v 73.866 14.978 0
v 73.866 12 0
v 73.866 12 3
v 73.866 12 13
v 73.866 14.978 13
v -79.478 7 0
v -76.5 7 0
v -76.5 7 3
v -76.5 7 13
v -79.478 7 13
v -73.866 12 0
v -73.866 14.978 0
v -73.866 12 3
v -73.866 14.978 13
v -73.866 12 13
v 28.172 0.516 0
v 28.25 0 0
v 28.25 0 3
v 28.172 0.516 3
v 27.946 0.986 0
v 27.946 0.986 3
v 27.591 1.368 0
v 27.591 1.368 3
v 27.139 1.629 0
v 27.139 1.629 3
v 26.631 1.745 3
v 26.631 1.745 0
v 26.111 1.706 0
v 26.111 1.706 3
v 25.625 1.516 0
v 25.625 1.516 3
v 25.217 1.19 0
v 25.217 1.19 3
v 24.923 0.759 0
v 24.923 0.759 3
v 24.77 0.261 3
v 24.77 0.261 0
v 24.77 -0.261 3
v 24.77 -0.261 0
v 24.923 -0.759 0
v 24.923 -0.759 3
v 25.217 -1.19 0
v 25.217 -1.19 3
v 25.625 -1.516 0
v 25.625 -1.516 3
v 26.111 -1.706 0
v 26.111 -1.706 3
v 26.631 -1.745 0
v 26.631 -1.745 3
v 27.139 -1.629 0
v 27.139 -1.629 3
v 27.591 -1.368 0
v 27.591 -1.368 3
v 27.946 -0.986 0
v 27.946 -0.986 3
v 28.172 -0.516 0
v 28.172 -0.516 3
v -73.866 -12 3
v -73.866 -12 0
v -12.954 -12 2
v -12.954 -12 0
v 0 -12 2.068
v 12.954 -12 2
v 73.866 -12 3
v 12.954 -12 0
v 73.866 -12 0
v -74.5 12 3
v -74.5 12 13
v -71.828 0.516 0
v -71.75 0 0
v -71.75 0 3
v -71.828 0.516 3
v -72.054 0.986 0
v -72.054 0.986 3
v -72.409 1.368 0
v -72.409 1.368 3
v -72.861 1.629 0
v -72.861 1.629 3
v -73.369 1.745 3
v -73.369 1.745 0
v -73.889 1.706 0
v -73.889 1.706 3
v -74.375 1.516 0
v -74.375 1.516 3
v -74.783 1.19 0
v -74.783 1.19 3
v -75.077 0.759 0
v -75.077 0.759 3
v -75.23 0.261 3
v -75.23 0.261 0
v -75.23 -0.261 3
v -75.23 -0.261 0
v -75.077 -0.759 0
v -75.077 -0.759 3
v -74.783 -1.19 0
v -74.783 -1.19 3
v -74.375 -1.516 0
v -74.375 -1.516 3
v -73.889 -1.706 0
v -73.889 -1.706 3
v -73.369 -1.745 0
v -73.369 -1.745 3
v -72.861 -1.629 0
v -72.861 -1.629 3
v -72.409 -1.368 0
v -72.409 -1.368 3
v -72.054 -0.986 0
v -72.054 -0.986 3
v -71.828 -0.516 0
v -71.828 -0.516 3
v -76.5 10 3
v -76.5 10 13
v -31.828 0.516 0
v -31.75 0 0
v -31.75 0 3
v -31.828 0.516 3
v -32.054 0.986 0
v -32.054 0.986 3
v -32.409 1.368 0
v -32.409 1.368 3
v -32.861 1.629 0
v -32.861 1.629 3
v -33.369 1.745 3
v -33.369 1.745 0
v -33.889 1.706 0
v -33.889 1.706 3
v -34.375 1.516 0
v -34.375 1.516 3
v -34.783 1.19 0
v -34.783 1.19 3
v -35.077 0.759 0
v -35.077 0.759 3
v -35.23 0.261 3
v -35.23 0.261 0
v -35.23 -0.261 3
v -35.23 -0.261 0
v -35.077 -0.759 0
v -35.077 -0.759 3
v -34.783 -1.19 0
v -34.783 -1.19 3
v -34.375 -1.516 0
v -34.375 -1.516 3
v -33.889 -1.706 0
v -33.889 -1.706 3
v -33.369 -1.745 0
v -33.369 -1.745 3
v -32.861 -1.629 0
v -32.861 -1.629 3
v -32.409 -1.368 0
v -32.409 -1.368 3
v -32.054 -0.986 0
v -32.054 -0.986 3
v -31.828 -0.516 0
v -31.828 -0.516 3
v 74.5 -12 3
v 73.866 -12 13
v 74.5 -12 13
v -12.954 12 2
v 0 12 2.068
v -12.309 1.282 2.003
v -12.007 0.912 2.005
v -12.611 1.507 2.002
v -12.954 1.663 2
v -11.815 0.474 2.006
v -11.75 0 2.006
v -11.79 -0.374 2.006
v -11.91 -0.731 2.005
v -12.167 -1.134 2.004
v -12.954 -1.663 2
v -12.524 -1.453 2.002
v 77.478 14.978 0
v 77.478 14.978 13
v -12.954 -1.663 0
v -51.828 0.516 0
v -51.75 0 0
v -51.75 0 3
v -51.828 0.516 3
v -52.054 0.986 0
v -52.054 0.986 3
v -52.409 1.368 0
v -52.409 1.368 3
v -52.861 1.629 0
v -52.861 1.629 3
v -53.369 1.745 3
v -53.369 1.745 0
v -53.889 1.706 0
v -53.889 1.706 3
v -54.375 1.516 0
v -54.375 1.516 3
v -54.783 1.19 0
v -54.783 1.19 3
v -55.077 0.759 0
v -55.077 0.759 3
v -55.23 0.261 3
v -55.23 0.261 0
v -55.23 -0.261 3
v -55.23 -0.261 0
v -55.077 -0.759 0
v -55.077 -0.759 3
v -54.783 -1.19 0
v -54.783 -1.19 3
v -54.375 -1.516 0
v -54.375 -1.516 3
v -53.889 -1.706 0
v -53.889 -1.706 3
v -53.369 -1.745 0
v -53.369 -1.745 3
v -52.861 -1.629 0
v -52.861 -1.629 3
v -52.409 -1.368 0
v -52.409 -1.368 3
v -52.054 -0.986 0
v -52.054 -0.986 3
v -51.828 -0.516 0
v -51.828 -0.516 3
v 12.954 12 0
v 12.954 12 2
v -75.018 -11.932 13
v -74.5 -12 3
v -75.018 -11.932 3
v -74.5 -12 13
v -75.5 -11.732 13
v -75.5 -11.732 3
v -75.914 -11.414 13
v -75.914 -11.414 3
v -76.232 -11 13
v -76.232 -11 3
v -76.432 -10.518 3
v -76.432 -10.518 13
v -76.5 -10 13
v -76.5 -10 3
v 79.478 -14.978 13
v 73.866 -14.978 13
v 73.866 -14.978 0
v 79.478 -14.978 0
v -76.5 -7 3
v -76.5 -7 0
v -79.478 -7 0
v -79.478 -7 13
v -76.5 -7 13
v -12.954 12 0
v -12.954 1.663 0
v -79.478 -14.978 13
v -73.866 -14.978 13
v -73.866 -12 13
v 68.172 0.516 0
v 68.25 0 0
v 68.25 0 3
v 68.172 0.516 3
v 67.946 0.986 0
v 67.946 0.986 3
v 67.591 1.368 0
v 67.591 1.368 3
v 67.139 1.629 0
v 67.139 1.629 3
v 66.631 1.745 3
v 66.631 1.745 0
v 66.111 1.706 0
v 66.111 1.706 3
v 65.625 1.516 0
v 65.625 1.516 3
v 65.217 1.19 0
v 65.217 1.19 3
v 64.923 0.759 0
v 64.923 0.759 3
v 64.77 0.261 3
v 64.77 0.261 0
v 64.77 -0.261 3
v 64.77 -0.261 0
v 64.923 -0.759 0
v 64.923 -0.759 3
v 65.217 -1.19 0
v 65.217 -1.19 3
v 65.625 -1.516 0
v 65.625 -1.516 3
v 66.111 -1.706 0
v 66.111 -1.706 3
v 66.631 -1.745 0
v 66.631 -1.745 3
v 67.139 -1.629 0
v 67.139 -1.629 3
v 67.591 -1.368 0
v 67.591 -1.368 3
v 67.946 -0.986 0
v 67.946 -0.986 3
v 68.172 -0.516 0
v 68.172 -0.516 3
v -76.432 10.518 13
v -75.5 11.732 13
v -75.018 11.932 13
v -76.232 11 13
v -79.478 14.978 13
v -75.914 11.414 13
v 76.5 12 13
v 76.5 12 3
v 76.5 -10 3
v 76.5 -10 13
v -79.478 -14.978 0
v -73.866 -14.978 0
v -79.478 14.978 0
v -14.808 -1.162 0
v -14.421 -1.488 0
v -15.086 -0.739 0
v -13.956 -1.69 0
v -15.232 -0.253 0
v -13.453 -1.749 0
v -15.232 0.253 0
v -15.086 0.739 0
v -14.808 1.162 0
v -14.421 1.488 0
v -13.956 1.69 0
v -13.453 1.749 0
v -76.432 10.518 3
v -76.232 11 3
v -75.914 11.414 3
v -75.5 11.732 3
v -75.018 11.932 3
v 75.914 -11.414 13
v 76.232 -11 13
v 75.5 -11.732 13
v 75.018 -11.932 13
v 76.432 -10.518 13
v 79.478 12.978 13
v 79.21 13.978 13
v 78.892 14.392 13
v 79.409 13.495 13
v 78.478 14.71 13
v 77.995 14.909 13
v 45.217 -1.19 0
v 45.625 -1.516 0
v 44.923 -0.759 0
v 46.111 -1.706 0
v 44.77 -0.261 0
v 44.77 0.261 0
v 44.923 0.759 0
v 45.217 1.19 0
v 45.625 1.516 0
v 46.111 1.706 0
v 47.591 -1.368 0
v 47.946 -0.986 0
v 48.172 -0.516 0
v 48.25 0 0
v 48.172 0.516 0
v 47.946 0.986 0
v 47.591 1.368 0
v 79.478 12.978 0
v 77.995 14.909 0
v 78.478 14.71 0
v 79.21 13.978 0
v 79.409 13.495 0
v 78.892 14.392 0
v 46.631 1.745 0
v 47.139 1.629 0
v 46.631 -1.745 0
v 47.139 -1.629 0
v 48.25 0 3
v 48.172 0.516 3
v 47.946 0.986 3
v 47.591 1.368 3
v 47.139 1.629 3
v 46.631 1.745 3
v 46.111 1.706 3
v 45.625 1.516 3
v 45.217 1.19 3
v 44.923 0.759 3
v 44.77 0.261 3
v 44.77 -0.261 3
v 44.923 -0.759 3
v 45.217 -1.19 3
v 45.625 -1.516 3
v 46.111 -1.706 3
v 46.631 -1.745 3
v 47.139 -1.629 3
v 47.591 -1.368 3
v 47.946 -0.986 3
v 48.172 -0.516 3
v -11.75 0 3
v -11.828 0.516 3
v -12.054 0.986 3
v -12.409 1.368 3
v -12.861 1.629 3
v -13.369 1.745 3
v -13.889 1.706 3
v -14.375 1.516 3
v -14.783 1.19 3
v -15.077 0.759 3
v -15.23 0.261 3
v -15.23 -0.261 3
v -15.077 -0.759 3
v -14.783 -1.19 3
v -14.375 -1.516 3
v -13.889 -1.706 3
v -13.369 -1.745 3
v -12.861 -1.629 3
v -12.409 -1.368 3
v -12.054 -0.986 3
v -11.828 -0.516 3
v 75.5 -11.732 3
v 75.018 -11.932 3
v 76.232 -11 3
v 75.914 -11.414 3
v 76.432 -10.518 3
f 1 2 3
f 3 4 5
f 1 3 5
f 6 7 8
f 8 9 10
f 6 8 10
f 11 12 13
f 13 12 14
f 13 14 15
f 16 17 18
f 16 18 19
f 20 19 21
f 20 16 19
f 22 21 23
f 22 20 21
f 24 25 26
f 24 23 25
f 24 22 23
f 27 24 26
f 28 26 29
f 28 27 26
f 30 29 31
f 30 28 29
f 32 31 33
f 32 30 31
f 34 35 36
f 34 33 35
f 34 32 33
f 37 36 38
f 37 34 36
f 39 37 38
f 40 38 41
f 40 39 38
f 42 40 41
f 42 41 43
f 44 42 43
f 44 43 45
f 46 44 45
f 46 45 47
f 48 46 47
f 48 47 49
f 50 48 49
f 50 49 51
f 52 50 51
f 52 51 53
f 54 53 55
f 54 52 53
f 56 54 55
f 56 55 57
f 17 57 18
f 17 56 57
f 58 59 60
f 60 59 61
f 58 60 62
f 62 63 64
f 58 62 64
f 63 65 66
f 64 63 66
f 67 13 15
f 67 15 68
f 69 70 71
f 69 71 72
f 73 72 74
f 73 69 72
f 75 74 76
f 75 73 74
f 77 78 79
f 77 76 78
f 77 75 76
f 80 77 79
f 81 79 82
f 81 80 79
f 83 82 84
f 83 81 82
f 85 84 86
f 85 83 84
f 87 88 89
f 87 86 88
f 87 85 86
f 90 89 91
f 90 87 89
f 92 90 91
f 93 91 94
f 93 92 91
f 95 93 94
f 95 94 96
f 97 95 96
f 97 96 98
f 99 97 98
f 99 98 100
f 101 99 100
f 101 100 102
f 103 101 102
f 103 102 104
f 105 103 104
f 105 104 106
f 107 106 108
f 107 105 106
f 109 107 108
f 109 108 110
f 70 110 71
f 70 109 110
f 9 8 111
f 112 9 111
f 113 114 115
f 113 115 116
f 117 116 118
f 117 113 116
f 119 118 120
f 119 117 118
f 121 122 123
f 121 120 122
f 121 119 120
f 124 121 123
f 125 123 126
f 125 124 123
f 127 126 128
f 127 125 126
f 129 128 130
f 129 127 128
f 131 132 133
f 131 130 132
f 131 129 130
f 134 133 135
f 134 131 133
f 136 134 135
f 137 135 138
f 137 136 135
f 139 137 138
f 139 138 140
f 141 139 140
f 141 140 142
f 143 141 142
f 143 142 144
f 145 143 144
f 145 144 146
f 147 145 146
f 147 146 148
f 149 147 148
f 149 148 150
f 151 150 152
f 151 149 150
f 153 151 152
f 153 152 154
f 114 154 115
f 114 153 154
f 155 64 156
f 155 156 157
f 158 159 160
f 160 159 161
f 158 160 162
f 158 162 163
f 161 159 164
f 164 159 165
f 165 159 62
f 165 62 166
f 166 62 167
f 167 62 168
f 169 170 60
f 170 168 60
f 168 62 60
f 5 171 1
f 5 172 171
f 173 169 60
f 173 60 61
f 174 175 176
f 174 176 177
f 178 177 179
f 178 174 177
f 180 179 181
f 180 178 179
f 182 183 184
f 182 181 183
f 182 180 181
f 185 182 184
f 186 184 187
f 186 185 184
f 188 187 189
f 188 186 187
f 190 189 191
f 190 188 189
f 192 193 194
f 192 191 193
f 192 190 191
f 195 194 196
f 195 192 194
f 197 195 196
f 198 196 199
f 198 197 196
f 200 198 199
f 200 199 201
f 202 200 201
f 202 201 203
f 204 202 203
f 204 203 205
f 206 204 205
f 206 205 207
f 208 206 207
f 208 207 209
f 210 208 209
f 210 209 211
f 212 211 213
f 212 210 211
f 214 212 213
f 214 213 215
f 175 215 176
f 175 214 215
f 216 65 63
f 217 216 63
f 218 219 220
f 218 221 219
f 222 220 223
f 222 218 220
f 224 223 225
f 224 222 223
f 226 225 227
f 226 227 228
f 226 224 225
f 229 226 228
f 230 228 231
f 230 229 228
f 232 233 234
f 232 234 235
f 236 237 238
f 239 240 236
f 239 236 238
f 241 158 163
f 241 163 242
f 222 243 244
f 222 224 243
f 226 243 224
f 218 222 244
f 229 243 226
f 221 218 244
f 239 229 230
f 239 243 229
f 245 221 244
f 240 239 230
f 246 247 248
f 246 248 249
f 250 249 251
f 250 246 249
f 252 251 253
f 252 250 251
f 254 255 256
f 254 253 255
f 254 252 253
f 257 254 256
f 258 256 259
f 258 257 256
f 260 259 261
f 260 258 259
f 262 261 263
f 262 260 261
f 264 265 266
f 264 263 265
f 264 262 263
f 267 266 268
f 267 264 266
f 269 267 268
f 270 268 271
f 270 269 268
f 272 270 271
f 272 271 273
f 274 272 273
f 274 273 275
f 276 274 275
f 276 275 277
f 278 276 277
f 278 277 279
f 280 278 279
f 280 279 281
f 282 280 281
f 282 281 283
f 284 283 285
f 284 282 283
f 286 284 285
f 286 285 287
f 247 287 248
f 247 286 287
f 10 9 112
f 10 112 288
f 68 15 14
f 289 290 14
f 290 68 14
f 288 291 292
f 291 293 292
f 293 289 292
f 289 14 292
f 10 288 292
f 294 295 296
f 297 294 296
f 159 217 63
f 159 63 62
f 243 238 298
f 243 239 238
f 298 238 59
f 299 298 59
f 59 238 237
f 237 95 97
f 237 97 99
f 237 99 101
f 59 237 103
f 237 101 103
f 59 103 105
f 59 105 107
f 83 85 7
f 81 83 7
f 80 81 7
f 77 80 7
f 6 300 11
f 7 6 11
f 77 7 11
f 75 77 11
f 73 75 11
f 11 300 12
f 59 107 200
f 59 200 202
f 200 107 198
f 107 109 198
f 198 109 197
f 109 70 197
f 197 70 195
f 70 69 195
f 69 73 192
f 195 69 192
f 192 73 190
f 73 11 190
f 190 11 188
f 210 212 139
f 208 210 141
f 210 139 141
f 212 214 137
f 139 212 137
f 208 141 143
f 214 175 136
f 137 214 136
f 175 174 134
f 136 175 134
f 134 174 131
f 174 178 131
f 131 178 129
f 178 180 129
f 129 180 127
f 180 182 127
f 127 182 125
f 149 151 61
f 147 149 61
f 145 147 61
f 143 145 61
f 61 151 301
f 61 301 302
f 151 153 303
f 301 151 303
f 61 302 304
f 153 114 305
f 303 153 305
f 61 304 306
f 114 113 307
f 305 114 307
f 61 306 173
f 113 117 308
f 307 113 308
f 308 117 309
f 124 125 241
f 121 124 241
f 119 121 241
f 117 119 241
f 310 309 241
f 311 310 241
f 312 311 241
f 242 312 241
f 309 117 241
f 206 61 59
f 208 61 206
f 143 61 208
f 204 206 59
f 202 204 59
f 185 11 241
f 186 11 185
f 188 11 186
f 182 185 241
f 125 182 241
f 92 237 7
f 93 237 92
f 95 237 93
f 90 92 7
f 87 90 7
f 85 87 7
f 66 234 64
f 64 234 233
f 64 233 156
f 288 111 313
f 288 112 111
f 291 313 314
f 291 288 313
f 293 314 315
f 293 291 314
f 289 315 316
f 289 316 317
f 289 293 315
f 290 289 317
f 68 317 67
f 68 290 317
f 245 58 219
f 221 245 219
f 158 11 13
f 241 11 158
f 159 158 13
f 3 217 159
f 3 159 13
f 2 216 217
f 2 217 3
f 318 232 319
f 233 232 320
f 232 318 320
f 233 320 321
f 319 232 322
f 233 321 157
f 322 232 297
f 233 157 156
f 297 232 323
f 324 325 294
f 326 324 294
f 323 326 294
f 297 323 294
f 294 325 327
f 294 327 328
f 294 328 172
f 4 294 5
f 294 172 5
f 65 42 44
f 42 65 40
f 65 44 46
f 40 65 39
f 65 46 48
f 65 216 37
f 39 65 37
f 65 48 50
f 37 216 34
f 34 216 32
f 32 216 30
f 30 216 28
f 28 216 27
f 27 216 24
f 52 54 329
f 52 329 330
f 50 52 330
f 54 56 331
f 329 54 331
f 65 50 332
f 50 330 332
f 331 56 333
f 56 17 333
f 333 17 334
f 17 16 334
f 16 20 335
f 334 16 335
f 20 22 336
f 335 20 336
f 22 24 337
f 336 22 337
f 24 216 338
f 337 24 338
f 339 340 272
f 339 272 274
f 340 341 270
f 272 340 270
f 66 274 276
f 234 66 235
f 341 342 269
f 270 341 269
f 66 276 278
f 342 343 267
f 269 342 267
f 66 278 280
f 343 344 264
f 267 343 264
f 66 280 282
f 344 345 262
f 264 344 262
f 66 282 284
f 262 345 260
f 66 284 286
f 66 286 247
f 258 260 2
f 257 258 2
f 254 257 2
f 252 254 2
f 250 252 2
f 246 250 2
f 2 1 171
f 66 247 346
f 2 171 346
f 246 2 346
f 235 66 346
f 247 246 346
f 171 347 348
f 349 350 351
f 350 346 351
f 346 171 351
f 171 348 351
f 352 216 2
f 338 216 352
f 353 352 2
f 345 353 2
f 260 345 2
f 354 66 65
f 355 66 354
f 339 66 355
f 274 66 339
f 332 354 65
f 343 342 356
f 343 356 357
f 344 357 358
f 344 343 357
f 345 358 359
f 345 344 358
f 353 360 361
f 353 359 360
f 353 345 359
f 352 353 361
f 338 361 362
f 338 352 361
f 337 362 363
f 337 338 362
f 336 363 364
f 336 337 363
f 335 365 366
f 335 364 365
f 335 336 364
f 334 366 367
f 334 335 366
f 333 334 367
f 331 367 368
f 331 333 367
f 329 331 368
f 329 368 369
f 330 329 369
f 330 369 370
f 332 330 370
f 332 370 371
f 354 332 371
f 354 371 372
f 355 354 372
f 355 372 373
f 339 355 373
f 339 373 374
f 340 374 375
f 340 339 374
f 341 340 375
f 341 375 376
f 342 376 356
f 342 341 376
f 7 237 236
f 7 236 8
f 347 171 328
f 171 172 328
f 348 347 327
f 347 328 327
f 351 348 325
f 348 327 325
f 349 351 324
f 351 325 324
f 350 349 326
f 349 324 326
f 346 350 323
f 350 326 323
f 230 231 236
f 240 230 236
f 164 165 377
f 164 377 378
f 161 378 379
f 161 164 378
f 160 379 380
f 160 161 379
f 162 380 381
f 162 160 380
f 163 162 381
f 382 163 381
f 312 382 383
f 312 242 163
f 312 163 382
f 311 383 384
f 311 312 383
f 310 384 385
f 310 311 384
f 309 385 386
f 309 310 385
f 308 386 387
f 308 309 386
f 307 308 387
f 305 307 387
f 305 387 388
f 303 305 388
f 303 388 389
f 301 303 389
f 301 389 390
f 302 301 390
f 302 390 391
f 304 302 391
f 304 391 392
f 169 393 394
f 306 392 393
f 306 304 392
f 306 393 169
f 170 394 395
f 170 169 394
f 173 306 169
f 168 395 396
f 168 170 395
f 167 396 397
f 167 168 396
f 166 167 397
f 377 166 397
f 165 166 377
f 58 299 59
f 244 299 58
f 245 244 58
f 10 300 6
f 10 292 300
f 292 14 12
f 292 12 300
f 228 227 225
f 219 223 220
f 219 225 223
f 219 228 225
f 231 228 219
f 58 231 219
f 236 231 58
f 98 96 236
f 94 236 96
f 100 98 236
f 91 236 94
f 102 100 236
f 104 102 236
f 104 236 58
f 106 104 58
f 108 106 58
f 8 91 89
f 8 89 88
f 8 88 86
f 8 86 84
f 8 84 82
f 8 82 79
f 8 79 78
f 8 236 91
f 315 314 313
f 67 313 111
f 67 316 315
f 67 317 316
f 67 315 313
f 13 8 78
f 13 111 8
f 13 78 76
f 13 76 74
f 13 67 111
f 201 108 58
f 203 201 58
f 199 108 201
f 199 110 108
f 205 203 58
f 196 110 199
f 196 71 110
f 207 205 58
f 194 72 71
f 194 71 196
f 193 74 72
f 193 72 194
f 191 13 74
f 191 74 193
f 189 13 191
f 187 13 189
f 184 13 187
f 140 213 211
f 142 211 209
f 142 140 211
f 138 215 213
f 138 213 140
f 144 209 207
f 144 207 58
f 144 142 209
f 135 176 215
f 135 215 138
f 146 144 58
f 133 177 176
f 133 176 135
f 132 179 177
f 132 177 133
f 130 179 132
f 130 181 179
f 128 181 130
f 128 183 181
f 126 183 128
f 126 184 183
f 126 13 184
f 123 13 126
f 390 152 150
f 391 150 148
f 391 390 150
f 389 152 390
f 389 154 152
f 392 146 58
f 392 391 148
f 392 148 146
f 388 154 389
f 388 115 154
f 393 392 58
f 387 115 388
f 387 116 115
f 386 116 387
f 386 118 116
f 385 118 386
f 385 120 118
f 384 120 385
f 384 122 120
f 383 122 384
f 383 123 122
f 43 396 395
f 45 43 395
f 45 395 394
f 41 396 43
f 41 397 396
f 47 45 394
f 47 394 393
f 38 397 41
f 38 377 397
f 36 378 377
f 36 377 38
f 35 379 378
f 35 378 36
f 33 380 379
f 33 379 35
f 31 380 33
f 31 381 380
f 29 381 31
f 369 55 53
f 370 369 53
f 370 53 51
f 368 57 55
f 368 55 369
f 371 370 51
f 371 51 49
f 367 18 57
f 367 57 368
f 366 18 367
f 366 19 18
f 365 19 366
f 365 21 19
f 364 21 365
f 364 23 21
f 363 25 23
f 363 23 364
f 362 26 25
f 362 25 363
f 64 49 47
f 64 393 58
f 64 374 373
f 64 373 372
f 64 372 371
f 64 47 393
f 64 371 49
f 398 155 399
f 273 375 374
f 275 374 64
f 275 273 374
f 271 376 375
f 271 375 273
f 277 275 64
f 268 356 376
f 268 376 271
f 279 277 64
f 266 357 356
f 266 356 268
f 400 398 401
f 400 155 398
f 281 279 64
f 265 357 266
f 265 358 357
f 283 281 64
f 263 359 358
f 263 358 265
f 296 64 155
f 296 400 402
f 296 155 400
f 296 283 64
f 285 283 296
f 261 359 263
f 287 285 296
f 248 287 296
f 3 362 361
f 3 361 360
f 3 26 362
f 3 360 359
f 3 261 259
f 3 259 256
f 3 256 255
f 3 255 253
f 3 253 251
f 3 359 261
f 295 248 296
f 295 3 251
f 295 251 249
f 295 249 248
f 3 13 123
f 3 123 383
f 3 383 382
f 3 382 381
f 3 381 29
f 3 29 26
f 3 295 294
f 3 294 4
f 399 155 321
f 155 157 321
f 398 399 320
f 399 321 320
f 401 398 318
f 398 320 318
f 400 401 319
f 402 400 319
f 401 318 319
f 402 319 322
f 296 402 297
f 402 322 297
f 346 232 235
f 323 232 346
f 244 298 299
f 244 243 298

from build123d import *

# Parameters (mm, degrees)
SKETCH1_W                = 153
SKETCH1_H                = 24
BOSS_EXTRUDE1_DEPTH      = 3
BOSS_EXTRUDE2_DEPTH      = 10
BOSS_EXTRUDE2_DEPTH_BACK = 3
CUT_EXTRUDE1_DEPTH       = 3.977609852
CUT_EXTRUDE1_DEPTH_BACK  = 27.977609852
CUT_EXTRUDE2_START       = -4
SKETCH5_R                = 1.75
CUT_EXTRUDE2_DEPTH       = 15
FILLET1_R                = 2
LPATTERN1_COUNT          = 8
LPATTERN1_PITCH          = 20


with BuildPart() as part:
    # Sketch1 → Boss-Extrude1 (new body)
    with BuildSketch(Plane.XY):
        Rectangle(SKETCH1_W, SKETCH1_H)
    extrude(amount=BOSS_EXTRUDE1_DEPTH)

    # Sketch3 → Boss-Extrude2 (add, two sides)
    with BuildSketch(Plane.XY.offset(3)) as boss_extrude2_sk:
        Polygon((-79.477609852, -9.365840911), (-79.477609852, -12.365840911), (-79.477609852, -14.977609852), (-76.865840911, -14.977609852), (-73.865840911, -14.977609852), (-73.865840911, -12), (-76.5, -12), (-76.5, -9.365840911), (-76.5, -7), (-79.477609852, -7), align=None)
        Polygon((-73.865840911, 14.977609852), (-73.865840911, 12), (-76.5, 12), (-76.5, 9.365840911), (-76.5, 7), (-79.477609852, 7), (-79.477609852, 9.365840911), (-79.477609852, 12.365840911), (-79.477609852, 14.977609852), (-76.865840911, 14.977609852), align=None)
        Polygon((79.477609852, 9.365840911), (79.477609852, -9.365840911), (79.477609852, -12.365840911), (79.477609852, -14.977609852), (76.865840911, -14.977609852), (73.865840911, -14.977609852), (73.865840911, -12), (76.5, -12), (76.5, -9.365840911), (76.5, 9.365840911), (76.5, 12), (73.865840911, 12), (73.865840911, 14.977609852), (76.865840911, 14.977609852), (79.477609852, 14.977609852), (79.477609852, 12.365840911), align=None)
    extrude(amount=BOSS_EXTRUDE2_DEPTH)
    extrude(boss_extrude2_sk.sketch, amount=-BOSS_EXTRUDE2_DEPTH_BACK)

    # Sketch4 → Cut-Extrude1 (cut, two sides)
    with BuildSketch(Plane.XZ.offset(12)) as cut_extrude1_sk:
        Polygon((-12.954, 2), (-12.954, 0), (12.954, 0), (12.954, 2), (0, 2.06825053), align=None)
    extrude(amount=CUT_EXTRUDE1_DEPTH, mode=Mode.SUBTRACT)
    extrude(cut_extrude1_sk.sketch, amount=-CUT_EXTRUDE1_DEPTH_BACK, mode=Mode.SUBTRACT)

    # Sketch5 → Cut-Extrude2 (cut)
    with BuildSketch(Plane.XY.offset(3).offset(CUT_EXTRUDE2_START)):
        with Locations((-73.5, 0)):
            Circle(SKETCH5_R)
    cut_extrude2 = extrude(amount=CUT_EXTRUDE2_DEPTH, mode=Mode.SUBTRACT)

    # Fillet1
    fillet1_edges = [part.edges().sort_by_distance(p)[0] for p in [
        (-76.5, 12, 8),
        (-76.5, -12, 8),
        (76.5, -12, 8),
        (79.477609852, 14.977609852, 6.5),
    ]]
    fillet(fillet1_edges, radius=FILLET1_R)

    # LPattern1: Cut-Extrude2 ×8, 1 skipped
    with Locations(*[(i * LPATTERN1_PITCH, 0, 0) for i in range(1, LPATTERN1_COUNT) if i not in (4,)]):
        add(cut_extrude2, mode=Mode.SUBTRACT)


solid = part.part
